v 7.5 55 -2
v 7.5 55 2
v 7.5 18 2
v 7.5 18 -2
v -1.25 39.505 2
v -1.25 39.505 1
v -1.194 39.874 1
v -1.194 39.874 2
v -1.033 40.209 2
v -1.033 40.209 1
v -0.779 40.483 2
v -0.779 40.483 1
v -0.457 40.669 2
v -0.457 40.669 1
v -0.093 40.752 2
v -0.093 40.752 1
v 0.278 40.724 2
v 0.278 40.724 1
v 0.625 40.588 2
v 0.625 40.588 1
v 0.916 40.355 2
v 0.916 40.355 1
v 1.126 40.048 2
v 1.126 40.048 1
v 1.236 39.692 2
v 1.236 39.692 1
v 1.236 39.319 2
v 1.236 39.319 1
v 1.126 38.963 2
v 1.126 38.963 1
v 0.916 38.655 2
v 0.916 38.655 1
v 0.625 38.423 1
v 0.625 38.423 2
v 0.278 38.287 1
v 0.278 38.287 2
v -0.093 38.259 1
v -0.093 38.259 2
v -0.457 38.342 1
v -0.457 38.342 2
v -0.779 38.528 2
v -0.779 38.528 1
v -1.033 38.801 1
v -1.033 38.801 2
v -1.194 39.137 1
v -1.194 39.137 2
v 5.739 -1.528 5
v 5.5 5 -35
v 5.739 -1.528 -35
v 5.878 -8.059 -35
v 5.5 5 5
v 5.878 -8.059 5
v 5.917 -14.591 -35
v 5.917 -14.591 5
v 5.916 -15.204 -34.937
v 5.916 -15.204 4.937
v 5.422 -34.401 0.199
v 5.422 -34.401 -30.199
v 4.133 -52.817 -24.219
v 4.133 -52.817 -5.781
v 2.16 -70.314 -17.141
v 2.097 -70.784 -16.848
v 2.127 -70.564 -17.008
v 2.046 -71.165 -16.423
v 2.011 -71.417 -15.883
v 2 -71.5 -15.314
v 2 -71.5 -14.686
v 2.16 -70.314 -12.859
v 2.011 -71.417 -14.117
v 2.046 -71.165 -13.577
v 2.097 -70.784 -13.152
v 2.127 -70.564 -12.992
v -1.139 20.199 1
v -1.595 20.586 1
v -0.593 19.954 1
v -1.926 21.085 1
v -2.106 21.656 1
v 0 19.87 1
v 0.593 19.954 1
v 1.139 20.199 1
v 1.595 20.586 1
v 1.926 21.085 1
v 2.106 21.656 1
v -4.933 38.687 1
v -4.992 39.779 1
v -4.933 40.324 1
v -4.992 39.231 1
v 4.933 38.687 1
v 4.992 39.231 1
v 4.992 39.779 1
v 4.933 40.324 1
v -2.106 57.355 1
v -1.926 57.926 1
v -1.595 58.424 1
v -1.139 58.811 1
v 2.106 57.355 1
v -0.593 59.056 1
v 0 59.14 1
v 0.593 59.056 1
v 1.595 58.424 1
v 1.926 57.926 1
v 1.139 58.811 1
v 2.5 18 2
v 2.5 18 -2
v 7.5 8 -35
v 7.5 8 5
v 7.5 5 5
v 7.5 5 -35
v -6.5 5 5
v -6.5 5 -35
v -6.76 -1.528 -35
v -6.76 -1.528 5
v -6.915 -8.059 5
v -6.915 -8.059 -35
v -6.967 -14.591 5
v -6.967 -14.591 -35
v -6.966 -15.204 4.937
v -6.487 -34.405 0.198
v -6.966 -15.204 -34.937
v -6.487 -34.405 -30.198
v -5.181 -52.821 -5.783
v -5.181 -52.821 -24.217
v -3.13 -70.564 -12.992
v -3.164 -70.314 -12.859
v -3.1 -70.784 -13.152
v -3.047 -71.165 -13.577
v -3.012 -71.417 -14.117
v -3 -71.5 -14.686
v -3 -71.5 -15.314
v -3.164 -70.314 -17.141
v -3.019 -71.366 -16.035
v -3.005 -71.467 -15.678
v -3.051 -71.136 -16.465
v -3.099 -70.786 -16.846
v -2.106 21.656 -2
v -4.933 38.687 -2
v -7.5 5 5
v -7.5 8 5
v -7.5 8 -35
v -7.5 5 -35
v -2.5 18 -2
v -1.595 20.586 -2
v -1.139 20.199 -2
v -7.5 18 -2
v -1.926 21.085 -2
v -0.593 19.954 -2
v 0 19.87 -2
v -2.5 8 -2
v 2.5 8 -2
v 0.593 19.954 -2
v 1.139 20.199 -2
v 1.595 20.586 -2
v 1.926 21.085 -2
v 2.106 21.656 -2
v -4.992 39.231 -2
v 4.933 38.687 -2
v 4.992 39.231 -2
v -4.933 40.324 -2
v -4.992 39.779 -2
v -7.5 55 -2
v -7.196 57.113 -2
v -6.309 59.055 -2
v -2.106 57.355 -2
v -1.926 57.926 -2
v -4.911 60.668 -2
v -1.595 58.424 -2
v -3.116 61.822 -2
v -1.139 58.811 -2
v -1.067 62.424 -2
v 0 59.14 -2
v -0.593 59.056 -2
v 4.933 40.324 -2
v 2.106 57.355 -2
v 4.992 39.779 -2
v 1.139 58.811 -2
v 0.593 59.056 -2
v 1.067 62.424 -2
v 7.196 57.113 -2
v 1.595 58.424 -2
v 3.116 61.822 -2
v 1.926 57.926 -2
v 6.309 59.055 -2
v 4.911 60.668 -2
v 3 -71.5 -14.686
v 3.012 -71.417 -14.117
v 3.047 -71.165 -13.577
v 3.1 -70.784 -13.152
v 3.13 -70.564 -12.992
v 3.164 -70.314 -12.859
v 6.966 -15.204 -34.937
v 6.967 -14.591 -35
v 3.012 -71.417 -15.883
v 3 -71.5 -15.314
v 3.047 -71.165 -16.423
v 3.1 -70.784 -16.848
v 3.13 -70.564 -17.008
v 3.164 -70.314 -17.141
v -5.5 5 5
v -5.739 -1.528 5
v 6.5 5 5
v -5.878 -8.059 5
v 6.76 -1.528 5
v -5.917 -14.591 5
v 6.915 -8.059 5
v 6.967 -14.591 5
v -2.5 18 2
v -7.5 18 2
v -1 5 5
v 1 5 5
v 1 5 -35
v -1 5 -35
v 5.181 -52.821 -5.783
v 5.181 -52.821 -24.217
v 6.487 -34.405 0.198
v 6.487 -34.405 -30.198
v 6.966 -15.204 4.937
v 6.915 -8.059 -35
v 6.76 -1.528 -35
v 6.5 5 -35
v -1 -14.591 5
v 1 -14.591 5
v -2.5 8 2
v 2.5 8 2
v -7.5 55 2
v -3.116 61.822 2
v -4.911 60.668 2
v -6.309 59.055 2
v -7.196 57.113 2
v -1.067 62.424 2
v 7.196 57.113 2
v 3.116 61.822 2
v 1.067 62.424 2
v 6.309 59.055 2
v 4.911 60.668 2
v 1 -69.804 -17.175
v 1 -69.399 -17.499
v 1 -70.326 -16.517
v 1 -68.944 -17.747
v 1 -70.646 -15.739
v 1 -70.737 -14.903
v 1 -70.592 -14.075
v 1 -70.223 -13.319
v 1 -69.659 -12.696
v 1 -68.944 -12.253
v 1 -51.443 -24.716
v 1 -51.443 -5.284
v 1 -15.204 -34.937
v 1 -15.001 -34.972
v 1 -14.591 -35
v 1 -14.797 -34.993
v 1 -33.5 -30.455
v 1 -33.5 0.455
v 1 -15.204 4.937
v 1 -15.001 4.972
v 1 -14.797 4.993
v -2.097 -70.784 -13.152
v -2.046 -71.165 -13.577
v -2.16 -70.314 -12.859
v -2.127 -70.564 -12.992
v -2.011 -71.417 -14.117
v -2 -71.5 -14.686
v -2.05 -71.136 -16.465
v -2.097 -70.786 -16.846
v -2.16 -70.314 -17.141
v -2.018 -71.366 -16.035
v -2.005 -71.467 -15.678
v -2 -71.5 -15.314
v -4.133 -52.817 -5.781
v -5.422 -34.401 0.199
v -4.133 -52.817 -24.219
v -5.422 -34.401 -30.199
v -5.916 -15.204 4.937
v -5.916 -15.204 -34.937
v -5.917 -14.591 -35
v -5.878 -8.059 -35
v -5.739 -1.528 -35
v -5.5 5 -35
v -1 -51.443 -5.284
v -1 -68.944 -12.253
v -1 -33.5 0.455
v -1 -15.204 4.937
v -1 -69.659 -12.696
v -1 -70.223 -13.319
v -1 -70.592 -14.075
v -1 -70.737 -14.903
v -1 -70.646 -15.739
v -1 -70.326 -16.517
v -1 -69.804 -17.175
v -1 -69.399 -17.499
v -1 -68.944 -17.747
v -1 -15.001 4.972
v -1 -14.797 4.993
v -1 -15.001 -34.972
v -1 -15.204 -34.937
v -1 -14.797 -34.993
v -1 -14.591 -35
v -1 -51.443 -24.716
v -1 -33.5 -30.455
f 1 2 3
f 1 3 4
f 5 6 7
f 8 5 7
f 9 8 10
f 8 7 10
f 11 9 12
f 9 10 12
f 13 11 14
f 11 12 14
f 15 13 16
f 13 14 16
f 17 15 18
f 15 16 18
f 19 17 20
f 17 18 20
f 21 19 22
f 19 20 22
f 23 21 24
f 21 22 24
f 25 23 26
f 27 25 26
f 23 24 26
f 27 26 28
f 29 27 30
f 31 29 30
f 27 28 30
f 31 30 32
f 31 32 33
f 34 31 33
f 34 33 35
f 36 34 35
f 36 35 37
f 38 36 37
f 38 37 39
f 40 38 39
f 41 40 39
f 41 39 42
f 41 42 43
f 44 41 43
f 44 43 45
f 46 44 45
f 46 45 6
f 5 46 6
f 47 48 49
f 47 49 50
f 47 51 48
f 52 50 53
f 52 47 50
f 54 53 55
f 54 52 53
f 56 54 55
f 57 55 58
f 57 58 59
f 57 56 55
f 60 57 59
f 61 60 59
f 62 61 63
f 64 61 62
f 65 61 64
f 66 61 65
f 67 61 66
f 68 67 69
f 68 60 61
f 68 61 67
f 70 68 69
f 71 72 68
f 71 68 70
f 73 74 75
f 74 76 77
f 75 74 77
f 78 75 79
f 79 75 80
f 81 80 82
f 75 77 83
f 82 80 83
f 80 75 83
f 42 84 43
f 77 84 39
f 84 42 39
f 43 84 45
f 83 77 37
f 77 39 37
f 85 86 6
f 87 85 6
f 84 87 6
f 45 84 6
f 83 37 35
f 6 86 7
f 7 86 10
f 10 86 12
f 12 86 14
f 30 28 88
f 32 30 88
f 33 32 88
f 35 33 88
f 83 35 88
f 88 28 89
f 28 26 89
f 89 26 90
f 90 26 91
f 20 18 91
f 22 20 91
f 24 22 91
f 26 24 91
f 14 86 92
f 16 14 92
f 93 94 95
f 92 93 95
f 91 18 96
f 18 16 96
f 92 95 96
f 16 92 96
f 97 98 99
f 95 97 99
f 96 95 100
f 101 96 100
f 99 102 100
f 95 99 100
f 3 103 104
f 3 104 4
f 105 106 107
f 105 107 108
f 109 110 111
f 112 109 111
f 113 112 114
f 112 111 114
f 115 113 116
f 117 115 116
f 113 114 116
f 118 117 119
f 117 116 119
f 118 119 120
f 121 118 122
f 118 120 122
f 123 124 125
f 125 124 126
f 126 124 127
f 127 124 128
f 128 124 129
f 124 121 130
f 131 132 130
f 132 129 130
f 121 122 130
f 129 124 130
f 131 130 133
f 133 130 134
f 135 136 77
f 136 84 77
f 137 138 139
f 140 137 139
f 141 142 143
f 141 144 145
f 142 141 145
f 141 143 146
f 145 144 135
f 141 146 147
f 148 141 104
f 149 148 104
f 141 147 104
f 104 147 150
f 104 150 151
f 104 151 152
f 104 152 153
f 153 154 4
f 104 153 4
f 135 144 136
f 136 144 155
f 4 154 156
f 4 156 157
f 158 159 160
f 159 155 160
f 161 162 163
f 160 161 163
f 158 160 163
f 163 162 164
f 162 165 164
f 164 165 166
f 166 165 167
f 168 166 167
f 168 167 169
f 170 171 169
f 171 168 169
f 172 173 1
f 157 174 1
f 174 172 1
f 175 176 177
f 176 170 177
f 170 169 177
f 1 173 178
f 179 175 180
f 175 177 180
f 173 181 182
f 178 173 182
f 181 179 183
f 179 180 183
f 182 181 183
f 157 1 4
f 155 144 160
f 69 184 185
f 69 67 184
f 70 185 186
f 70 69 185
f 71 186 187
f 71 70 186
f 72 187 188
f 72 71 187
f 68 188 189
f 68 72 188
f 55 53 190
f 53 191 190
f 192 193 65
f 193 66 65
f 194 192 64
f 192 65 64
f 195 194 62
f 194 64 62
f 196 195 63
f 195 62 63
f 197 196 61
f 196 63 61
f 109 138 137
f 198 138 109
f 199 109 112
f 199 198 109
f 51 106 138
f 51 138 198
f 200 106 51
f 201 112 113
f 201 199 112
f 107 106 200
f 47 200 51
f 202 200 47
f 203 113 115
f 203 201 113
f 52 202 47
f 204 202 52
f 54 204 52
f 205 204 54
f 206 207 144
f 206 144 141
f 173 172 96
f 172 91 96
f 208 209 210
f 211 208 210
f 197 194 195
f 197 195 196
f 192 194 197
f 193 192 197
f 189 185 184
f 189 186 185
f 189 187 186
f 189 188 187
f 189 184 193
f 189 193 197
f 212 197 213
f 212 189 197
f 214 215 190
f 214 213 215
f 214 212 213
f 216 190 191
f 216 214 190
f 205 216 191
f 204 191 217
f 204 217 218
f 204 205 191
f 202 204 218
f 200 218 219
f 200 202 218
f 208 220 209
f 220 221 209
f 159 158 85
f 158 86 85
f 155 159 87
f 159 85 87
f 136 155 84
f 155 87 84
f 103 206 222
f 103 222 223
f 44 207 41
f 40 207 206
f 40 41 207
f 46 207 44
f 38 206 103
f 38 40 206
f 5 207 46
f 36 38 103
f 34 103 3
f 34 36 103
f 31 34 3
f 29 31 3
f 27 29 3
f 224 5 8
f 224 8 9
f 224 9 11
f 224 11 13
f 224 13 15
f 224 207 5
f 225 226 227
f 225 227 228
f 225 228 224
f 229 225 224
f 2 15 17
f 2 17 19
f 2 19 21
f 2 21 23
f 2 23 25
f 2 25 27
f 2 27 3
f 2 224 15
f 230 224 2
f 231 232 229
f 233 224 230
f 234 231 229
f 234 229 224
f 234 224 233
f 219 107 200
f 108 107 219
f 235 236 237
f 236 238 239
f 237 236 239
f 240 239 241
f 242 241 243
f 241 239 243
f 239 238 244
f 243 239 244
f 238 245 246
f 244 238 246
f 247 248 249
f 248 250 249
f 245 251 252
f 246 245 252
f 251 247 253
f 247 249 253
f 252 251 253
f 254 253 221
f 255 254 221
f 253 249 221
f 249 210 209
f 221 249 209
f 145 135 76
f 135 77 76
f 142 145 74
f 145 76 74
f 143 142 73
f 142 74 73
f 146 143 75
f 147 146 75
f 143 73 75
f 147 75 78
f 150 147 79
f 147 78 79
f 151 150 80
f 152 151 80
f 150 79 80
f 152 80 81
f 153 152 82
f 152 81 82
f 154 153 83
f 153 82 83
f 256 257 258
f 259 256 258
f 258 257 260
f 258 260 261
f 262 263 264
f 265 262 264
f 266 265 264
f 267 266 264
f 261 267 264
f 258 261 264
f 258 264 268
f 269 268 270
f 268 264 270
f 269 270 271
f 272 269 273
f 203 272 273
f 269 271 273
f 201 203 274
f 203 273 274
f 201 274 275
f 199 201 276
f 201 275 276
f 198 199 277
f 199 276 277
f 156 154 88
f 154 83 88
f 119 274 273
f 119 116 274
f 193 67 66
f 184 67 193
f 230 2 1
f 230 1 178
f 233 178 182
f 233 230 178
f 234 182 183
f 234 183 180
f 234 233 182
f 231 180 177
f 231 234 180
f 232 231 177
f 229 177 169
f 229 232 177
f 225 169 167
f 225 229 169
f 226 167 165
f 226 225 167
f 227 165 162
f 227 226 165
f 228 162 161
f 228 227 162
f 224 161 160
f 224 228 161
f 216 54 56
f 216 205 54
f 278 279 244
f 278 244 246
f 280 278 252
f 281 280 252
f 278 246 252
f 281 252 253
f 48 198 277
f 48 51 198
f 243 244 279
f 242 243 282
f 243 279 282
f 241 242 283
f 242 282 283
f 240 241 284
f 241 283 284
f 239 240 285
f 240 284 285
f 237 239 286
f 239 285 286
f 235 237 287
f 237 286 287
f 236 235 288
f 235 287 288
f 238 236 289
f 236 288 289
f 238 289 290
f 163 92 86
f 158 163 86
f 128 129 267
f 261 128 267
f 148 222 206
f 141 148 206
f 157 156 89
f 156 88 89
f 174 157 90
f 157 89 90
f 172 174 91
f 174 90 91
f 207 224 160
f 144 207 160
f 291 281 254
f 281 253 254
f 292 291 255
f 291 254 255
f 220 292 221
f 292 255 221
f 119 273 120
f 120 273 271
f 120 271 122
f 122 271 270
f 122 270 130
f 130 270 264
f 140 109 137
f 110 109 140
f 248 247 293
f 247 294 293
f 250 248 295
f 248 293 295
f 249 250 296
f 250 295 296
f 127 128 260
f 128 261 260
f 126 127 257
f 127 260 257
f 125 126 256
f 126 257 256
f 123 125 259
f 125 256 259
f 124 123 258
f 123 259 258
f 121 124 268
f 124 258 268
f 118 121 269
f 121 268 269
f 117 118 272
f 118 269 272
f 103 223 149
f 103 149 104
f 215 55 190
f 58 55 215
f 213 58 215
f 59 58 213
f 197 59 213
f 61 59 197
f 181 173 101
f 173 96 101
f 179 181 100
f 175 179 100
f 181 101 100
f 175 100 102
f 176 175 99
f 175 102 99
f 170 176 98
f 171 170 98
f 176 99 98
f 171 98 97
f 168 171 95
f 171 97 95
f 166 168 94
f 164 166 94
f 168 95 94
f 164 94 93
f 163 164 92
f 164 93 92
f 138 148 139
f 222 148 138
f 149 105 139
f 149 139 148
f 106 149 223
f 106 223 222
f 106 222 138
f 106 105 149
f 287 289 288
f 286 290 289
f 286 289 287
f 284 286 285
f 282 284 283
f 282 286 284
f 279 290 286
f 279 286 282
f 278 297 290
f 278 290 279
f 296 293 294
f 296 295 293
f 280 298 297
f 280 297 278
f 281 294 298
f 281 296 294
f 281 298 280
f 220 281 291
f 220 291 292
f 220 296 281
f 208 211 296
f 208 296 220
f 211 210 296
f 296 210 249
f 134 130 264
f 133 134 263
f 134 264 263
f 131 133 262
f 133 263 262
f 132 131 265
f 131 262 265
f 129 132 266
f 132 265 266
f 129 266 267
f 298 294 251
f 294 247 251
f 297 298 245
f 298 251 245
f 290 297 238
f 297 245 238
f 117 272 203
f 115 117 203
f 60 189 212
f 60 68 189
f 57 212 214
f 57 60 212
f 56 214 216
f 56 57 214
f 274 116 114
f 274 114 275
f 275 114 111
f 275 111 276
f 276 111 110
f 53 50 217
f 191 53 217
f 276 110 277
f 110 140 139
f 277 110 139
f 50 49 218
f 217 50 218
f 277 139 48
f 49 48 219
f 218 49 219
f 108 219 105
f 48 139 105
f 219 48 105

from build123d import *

# Parameters (mm, degrees)
EXTRUDE_1_DEPTH          = 2
EXTRUDE_1_DEPTH_BACK     = 2
EXTRUDE_2_DEPTH          = 7.5
EXTRUDE_2_DEPTH_BACK     = 7.5
EXTRUDE_4_DEPTH          = 1
EXTRUDE_4_DEPTH_BACK     = 1
EXTRUDE_8_DEPTH          = 23
EXTRUDE_8_DEPTH_BACK     = 17
SKETCH_21_W              = 5
SKETCH_21_H              = 10
CUT_EXTRUDE_4_DEPTH      = 4
CUT_EXTRUDE_5_DEPTH      = 1
CUT_EXTRUDE_5_DEPTH_BACK = 2
SKETCH_23_R              = 1.25
CUT_EXTRUDE_6_DEPTH      = 13
FILLET_11_R              = 3
FILLET_12_R              = 3
FILLET_13_R              = 3
CUT_EXTRUDE_7_DEPTH      = 10
CUT_EXTRUDE_7_DEPTH_BACK = 10
FILLET_17_R              = 2
FILLET_18_R              = 2
FILLET_19_R              = 2
FILLET_20_R              = 2
FILLET_21_R              = 3
FILLET_22_R              = 3
FILLET_23_R              = 3
FILLET_24_R              = 3


with BuildPart() as part:
    # 草圖1 → 填料-伸長1 (new, two sides: drawn at the far end of the back side and taken through both)
    with BuildSketch(Plane.XY.offset(-EXTRUDE_1_DEPTH_BACK)):
        with BuildLine():
            Line((7.5, 8), (7.5, 55))
            ThreePointArc((7.5, 55), (0, 62.5), (-7.5, 55))
            Line((-7.5, 55), (-7.5, 8))
            Line((-7.5, 8), (7.5, 8))
        make_face()
    extrude(amount=EXTRUDE_1_DEPTH + EXTRUDE_1_DEPTH_BACK)

    # 草圖6 → 填料-伸長2 (add, two sides: drawn at the far end of the back side and taken through both)
    with BuildSketch(Plane(origin=(0, 0, 0), x_dir=(0, 0, -1), z_dir=(1, 0, 0)).offset(-EXTRUDE_2_DEPTH_BACK)):
        Polygon((-2, 8), (-5, 8), (-5, 5), (-2, 5), (35, 5), (35, 8), align=None)
    extrude(amount=EXTRUDE_2_DEPTH + EXTRUDE_2_DEPTH_BACK)

    # 草圖19 → 填料-伸長8 (add, two sides: drawn at the far end of the back side and taken through both)
    with BuildSketch(Plane.XY.offset(-18).offset(-EXTRUDE_8_DEPTH_BACK)):
        with BuildLine():
            Line((6.5, 5), (5.5, 5))
            ThreePointArc((5.5, 5), (5.47282517, -33.328822067), (2, -71.5))
            Line((2, -71.5), (3, -71.5))
            ThreePointArc((3, -71.5), (6.537897336, -33.331799225), (6.5, 5))
        make_face()
        with BuildLine():
            Line((-3, -71.5), (-2, -71.5))
            ThreePointArc((-2, -71.5), (-5.47282517, -33.328822067), (-5.5, 5))
            Line((-5.5, 5), (-6.5, 5))
            ThreePointArc((-6.5, 5), (-6.537897336, -33.331799225), (-3, -71.5))
        make_face()
    extrude(amount=EXTRUDE_8_DEPTH + EXTRUDE_8_DEPTH_BACK)

    # 草圖21 → 除料-伸長4 (cut)
    with BuildSketch(Plane.XY.offset(2)):
        with Locations((-5, 13)):
            Rectangle(SKETCH_21_W, SKETCH_21_H)
        with Locations((5, 13)):
            Rectangle(SKETCH_21_W, SKETCH_21_H)
    extrude(amount=-CUT_EXTRUDE_4_DEPTH, mode=Mode.SUBTRACT)

    # 草圖3 → 除料-伸長5 (cut, two sides: drawn at the far end of the back side and taken through both)
    with BuildSketch(Plane.XY.offset(-CUT_EXTRUDE_5_DEPTH_BACK)):
        with BuildLine():
            Line((-2.106194146, 57.35480611), (-4.932538983, 40.323847539))
            ThreePointArc((-4.932538983, 40.323847539), (-5, 39.50527611), (-4.932538983, 38.686704682))
            Line((-4.932538983, 38.686704682), (-2.106194146, 21.65574611))
            ThreePointArc((-2.106194146, 21.65574611), (0, 19.87027611), (2.106194146, 21.65574611))
            Line((2.106194146, 21.65574611), (4.932538983, 38.686704682))
            ThreePointArc((4.932538983, 38.686704682), (5, 39.50527611), (4.932538983, 40.323847539))
            Line((4.932538983, 40.323847539), (2.106194146, 57.35480611))
            ThreePointArc((2.106194146, 57.35480611), (0, 59.14027611), (-2.106194146, 57.35480611))
        make_face()
    extrude(amount=CUT_EXTRUDE_5_DEPTH + CUT_EXTRUDE_5_DEPTH_BACK, mode=Mode.SUBTRACT)

    # 草圖23 → 除料-伸長6 (cut)
    with BuildSketch(Plane(origin=(0, 0, -2), x_dir=(-1, 0, 0), z_dir=(0, 0, -1))):
        with Locations((0, 39.50527611)):
            Circle(SKETCH_23_R)
    extrude(amount=-CUT_EXTRUDE_6_DEPTH, mode=Mode.SUBTRACT)

    # 草圖20 → 除料-伸長7 (cut, two sides: drawn at the far end of the back side and taken through both)
    with BuildSketch(Plane(origin=(0, 0, 0), x_dir=(0, 0, -1), z_dir=(1, 0, 0)).offset(-CUT_EXTRUDE_7_DEPTH_BACK)):
        with BuildLine():
            ThreePointArc((15, -75), (3.242716215, -45.534786617), (-5, -14.9))
            Line((-5, -14.9), (-5, -75))
            Line((-5, -75), (15, -75))
        make_face()
        with BuildLine():
            ThreePointArc((35, -14.9), (26.757283785, -45.534786617), (15, -75))
            Line((15, -75), (35, -75))
            Line((35, -75), (35, -14.9))
        make_face()
    extrude(amount=CUT_EXTRUDE_7_DEPTH + CUT_EXTRUDE_7_DEPTH_BACK, mode=Mode.SUBTRACT)

    # 圓角17
    fillet_17_edges = [part.edges().sort_by_distance(p)[0] for p in [
        (2.5, -71.5, -16.609354803),
    ]]
    fillet(fillet_17_edges, radius=FILLET_17_R)

    # 圓角18
    fillet_18_edges = [part.edges().sort_by_distance(p)[0] for p in [
        (2.5, -71.5, -13.390645197),
    ]]
    fillet(fillet_18_edges, radius=FILLET_18_R)

    # 圓角19
    fillet_19_edges = [part.edges().sort_by_distance(p)[0] for p in [
        (-2.5, -71.5, -16.609354803),
    ]]
    fillet(fillet_19_edges, radius=FILLET_19_R)

    # 圓角20
    fillet_20_edges = [part.edges().sort_by_distance(p)[0] for p in [
        (-2.5, -71.5, -13.390645197),
    ]]
    fillet(fillet_20_edges, radius=FILLET_20_R)

    # 圓角21
    fillet_21_edges = [part.edges().sort_by_distance(p)[0] for p in [
        (-6.441667624, -14.9, 5),
    ]]
    fillet(fillet_21_edges, radius=FILLET_21_R)

    # 圓角22
    fillet_22_edges = [part.edges().sort_by_distance(p)[0] for p in [
        (6.441667624, -14.9, 5),
    ]]
    fillet(fillet_22_edges, radius=FILLET_22_R)

    # 圓角23
    fillet_23_edges = [part.edges().sort_by_distance(p)[0] for p in [
        (-6.441667624, -14.9, -35),
    ]]
    fillet(fillet_23_edges, radius=FILLET_23_R)

    # 圓角24
    fillet_24_edges = [part.edges().sort_by_distance(p)[0] for p in [
        (6.441667624, -14.9, -35),
    ]]
    fillet(fillet_24_edges, radius=FILLET_24_R)


with BuildPart() as body_2:
    # 草圖8 → 填料-伸長4 (new, two sides: drawn at the far end of the back side and taken through both)
    with BuildSketch(Plane(origin=(0, 0, 0), x_dir=(0, 0, -1), z_dir=(1, 0, 0)).offset(-EXTRUDE_4_DEPTH_BACK)):
        with BuildLine():
            Line((35, 5), (35, -14.9))
            ThreePointArc((35, -14.9), (26.757283785, -45.534786617), (15, -75))
            ThreePointArc((15, -75), (3.242716215, -45.534786617), (-5, -14.9))
            Line((-5, -14.9), (-5, 5))
            Line((-5, 5), (35, 5))
        make_face()
    extrude(amount=EXTRUDE_4_DEPTH + EXTRUDE_4_DEPTH_BACK)

    # 圓角11
    fillet_11_edges = [body_2.edges().sort_by_distance(p)[0] for p in [
        (0, -75, -15),
    ]]
    fillet(fillet_11_edges, radius=FILLET_11_R)

    # 圓角12
    fillet_12_edges = [body_2.edges().sort_by_distance(p)[0] for p in [
        (0, -14.9, 5),
    ]]
    fillet(fillet_12_edges, radius=FILLET_12_R)

    # 圓角13
    fillet_13_edges = [body_2.edges().sort_by_distance(p)[0] for p in [
        (0, -14.9, -35),
    ]]
    fillet(fillet_13_edges, radius=FILLET_13_R)


solid = Compound([part.part, body_2.part])
